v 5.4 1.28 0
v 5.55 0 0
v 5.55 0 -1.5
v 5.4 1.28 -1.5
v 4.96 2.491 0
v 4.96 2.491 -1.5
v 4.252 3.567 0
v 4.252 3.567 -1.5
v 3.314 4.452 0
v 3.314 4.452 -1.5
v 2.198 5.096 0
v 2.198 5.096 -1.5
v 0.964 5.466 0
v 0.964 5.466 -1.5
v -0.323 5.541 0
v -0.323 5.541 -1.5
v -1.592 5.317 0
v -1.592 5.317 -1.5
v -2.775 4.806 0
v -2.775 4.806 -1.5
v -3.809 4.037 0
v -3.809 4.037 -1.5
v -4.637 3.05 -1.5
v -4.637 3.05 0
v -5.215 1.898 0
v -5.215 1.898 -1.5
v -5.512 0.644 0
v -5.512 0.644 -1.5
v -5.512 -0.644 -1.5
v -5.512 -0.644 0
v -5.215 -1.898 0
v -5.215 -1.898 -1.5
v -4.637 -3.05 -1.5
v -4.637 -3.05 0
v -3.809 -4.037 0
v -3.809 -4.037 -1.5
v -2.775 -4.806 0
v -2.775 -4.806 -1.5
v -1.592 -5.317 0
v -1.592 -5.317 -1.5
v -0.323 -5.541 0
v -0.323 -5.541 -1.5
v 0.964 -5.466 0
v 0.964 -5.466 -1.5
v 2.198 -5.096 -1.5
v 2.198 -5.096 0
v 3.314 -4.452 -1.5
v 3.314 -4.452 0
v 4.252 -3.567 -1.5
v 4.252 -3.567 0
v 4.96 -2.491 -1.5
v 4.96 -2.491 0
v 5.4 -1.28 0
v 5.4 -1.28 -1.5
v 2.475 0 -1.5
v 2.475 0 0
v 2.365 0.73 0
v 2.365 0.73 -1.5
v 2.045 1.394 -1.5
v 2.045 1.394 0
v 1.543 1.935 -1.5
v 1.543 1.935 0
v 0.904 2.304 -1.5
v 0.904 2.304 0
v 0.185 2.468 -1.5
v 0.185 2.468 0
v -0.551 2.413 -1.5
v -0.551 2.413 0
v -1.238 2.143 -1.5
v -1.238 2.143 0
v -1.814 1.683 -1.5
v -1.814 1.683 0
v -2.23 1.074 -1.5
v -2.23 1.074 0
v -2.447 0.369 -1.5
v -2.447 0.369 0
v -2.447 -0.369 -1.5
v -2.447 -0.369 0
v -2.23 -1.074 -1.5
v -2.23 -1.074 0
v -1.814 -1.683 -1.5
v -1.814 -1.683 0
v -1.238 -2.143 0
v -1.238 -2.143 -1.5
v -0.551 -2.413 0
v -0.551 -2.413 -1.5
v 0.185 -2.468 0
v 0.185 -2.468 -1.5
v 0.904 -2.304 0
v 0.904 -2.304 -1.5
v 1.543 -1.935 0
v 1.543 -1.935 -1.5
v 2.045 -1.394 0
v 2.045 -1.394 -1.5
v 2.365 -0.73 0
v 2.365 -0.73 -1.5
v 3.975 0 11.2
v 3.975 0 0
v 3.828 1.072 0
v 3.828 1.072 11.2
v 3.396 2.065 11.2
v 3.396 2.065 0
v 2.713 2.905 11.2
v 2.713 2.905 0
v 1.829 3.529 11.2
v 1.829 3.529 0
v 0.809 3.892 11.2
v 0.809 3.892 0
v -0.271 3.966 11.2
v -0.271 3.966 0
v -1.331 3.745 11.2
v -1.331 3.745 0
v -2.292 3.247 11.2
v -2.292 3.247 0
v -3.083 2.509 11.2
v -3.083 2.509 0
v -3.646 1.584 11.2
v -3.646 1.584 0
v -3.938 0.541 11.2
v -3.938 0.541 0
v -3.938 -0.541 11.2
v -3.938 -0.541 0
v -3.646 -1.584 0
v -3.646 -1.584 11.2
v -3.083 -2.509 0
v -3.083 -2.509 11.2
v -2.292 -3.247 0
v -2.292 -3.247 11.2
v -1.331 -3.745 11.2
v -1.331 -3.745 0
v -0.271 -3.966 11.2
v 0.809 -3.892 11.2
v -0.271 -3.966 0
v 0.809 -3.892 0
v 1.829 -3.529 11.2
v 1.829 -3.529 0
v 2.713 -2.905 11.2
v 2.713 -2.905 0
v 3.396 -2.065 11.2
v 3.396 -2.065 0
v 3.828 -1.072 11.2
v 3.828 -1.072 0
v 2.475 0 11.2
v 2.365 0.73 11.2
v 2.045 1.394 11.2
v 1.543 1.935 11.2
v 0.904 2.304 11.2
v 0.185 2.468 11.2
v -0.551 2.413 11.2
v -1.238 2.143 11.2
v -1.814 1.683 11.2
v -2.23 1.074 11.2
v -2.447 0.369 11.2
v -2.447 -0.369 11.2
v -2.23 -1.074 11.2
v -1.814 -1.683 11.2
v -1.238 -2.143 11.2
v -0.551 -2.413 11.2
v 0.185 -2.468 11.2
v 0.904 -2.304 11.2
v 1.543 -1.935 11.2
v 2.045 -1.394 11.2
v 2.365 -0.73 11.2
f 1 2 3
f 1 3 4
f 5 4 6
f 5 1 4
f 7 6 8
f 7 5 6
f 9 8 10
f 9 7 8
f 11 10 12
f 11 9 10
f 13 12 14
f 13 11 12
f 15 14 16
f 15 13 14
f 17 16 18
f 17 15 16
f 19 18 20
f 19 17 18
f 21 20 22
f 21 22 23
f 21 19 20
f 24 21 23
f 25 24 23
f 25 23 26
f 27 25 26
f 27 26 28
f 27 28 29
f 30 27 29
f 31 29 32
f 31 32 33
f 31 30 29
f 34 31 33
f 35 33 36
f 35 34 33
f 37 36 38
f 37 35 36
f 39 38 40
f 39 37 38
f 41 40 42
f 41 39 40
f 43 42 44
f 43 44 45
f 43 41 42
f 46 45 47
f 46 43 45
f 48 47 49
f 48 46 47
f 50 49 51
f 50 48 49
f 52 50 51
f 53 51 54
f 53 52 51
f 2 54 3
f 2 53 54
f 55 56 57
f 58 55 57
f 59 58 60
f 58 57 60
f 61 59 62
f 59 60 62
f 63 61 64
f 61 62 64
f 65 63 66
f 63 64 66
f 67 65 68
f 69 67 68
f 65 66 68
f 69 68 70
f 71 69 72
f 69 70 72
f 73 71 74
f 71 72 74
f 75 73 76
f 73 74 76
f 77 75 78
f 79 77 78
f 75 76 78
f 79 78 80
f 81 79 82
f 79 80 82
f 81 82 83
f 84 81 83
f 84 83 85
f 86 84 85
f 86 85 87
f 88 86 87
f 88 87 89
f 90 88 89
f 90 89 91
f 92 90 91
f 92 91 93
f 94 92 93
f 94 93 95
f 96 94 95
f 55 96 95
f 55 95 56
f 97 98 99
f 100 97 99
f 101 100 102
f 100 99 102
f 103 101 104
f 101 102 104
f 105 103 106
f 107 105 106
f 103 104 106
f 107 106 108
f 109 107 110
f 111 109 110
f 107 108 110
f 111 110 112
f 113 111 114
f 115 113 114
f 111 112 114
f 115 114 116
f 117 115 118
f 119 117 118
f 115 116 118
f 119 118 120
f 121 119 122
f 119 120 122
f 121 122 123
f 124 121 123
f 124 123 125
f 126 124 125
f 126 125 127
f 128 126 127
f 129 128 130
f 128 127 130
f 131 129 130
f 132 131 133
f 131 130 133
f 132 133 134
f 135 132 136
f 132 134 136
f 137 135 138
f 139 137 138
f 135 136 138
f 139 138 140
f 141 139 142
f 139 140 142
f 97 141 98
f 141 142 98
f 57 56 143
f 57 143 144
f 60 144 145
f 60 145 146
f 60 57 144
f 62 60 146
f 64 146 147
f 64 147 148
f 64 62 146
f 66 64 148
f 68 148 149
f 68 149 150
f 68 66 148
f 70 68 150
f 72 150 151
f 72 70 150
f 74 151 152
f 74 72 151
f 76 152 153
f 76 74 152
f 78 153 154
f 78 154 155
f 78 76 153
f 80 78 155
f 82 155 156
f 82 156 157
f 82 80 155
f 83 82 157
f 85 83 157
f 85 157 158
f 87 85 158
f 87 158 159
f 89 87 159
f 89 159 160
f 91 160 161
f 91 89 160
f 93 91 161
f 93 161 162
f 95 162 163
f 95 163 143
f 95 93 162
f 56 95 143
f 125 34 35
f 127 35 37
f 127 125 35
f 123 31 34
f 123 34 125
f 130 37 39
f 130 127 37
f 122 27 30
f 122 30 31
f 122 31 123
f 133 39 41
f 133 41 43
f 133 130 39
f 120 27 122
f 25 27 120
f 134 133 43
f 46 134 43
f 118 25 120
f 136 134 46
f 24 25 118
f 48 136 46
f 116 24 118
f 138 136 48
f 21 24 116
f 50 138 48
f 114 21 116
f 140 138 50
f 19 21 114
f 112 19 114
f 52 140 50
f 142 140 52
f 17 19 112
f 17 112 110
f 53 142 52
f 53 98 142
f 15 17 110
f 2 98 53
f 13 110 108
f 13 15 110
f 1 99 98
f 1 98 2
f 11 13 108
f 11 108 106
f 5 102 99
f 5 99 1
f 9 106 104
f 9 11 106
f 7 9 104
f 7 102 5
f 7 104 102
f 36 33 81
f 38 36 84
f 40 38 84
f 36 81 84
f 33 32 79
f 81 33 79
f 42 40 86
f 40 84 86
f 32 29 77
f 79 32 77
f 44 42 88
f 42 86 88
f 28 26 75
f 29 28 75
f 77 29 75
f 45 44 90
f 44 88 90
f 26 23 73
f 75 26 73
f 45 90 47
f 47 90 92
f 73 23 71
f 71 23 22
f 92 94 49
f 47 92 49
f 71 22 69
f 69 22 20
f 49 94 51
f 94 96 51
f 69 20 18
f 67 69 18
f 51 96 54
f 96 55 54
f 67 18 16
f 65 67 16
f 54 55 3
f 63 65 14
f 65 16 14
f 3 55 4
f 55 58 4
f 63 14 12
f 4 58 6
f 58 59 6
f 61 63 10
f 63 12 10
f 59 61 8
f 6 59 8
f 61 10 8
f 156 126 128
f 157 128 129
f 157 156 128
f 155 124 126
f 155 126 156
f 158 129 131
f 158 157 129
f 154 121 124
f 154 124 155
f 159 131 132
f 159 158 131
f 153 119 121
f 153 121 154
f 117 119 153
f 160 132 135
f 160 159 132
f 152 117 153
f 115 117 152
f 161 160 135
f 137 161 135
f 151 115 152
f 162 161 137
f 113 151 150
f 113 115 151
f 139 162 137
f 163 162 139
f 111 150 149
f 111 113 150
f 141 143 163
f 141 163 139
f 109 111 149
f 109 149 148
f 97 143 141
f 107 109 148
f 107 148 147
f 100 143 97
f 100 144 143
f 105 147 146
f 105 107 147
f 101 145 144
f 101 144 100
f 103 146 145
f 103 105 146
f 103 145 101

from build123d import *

# Parameters (mm, degrees)
SKETCH1_R           = 5.55
BASE_FLANGE1_DEPTH  = 1.5
SKETCH9_R           = 3.975
SKETCH9_R_2         = 2.475
BOSS_EXTRUDE1_DEPTH = 11.2
SKETCH11_R          = 2.475
CUT_EXTRUDE1_DEPTH  = 14.676439595


# Sheet-metal steps are written as plain solids
with BuildPart() as part:
    # Sketch1 → Base-Flange1 (new body)
    with BuildSketch(Plane.XY):
        Circle(SKETCH1_R)
    extrude(amount=-BASE_FLANGE1_DEPTH)

    # Sketch9 → Boss-Extrude1 (add)
    with BuildSketch(Plane.XY):
        Circle(SKETCH9_R)
        Circle(SKETCH9_R_2, mode=Mode.SUBTRACT)
    extrude(amount=BOSS_EXTRUDE1_DEPTH)

    # Sketch11 → Cut-Extrude1 (cut, through all)
    with BuildSketch(Plane.XY):
        Circle(SKETCH11_R)
    extrude(amount=-CUT_EXTRUDE1_DEPTH, mode=Mode.SUBTRACT)


solid = part.part
